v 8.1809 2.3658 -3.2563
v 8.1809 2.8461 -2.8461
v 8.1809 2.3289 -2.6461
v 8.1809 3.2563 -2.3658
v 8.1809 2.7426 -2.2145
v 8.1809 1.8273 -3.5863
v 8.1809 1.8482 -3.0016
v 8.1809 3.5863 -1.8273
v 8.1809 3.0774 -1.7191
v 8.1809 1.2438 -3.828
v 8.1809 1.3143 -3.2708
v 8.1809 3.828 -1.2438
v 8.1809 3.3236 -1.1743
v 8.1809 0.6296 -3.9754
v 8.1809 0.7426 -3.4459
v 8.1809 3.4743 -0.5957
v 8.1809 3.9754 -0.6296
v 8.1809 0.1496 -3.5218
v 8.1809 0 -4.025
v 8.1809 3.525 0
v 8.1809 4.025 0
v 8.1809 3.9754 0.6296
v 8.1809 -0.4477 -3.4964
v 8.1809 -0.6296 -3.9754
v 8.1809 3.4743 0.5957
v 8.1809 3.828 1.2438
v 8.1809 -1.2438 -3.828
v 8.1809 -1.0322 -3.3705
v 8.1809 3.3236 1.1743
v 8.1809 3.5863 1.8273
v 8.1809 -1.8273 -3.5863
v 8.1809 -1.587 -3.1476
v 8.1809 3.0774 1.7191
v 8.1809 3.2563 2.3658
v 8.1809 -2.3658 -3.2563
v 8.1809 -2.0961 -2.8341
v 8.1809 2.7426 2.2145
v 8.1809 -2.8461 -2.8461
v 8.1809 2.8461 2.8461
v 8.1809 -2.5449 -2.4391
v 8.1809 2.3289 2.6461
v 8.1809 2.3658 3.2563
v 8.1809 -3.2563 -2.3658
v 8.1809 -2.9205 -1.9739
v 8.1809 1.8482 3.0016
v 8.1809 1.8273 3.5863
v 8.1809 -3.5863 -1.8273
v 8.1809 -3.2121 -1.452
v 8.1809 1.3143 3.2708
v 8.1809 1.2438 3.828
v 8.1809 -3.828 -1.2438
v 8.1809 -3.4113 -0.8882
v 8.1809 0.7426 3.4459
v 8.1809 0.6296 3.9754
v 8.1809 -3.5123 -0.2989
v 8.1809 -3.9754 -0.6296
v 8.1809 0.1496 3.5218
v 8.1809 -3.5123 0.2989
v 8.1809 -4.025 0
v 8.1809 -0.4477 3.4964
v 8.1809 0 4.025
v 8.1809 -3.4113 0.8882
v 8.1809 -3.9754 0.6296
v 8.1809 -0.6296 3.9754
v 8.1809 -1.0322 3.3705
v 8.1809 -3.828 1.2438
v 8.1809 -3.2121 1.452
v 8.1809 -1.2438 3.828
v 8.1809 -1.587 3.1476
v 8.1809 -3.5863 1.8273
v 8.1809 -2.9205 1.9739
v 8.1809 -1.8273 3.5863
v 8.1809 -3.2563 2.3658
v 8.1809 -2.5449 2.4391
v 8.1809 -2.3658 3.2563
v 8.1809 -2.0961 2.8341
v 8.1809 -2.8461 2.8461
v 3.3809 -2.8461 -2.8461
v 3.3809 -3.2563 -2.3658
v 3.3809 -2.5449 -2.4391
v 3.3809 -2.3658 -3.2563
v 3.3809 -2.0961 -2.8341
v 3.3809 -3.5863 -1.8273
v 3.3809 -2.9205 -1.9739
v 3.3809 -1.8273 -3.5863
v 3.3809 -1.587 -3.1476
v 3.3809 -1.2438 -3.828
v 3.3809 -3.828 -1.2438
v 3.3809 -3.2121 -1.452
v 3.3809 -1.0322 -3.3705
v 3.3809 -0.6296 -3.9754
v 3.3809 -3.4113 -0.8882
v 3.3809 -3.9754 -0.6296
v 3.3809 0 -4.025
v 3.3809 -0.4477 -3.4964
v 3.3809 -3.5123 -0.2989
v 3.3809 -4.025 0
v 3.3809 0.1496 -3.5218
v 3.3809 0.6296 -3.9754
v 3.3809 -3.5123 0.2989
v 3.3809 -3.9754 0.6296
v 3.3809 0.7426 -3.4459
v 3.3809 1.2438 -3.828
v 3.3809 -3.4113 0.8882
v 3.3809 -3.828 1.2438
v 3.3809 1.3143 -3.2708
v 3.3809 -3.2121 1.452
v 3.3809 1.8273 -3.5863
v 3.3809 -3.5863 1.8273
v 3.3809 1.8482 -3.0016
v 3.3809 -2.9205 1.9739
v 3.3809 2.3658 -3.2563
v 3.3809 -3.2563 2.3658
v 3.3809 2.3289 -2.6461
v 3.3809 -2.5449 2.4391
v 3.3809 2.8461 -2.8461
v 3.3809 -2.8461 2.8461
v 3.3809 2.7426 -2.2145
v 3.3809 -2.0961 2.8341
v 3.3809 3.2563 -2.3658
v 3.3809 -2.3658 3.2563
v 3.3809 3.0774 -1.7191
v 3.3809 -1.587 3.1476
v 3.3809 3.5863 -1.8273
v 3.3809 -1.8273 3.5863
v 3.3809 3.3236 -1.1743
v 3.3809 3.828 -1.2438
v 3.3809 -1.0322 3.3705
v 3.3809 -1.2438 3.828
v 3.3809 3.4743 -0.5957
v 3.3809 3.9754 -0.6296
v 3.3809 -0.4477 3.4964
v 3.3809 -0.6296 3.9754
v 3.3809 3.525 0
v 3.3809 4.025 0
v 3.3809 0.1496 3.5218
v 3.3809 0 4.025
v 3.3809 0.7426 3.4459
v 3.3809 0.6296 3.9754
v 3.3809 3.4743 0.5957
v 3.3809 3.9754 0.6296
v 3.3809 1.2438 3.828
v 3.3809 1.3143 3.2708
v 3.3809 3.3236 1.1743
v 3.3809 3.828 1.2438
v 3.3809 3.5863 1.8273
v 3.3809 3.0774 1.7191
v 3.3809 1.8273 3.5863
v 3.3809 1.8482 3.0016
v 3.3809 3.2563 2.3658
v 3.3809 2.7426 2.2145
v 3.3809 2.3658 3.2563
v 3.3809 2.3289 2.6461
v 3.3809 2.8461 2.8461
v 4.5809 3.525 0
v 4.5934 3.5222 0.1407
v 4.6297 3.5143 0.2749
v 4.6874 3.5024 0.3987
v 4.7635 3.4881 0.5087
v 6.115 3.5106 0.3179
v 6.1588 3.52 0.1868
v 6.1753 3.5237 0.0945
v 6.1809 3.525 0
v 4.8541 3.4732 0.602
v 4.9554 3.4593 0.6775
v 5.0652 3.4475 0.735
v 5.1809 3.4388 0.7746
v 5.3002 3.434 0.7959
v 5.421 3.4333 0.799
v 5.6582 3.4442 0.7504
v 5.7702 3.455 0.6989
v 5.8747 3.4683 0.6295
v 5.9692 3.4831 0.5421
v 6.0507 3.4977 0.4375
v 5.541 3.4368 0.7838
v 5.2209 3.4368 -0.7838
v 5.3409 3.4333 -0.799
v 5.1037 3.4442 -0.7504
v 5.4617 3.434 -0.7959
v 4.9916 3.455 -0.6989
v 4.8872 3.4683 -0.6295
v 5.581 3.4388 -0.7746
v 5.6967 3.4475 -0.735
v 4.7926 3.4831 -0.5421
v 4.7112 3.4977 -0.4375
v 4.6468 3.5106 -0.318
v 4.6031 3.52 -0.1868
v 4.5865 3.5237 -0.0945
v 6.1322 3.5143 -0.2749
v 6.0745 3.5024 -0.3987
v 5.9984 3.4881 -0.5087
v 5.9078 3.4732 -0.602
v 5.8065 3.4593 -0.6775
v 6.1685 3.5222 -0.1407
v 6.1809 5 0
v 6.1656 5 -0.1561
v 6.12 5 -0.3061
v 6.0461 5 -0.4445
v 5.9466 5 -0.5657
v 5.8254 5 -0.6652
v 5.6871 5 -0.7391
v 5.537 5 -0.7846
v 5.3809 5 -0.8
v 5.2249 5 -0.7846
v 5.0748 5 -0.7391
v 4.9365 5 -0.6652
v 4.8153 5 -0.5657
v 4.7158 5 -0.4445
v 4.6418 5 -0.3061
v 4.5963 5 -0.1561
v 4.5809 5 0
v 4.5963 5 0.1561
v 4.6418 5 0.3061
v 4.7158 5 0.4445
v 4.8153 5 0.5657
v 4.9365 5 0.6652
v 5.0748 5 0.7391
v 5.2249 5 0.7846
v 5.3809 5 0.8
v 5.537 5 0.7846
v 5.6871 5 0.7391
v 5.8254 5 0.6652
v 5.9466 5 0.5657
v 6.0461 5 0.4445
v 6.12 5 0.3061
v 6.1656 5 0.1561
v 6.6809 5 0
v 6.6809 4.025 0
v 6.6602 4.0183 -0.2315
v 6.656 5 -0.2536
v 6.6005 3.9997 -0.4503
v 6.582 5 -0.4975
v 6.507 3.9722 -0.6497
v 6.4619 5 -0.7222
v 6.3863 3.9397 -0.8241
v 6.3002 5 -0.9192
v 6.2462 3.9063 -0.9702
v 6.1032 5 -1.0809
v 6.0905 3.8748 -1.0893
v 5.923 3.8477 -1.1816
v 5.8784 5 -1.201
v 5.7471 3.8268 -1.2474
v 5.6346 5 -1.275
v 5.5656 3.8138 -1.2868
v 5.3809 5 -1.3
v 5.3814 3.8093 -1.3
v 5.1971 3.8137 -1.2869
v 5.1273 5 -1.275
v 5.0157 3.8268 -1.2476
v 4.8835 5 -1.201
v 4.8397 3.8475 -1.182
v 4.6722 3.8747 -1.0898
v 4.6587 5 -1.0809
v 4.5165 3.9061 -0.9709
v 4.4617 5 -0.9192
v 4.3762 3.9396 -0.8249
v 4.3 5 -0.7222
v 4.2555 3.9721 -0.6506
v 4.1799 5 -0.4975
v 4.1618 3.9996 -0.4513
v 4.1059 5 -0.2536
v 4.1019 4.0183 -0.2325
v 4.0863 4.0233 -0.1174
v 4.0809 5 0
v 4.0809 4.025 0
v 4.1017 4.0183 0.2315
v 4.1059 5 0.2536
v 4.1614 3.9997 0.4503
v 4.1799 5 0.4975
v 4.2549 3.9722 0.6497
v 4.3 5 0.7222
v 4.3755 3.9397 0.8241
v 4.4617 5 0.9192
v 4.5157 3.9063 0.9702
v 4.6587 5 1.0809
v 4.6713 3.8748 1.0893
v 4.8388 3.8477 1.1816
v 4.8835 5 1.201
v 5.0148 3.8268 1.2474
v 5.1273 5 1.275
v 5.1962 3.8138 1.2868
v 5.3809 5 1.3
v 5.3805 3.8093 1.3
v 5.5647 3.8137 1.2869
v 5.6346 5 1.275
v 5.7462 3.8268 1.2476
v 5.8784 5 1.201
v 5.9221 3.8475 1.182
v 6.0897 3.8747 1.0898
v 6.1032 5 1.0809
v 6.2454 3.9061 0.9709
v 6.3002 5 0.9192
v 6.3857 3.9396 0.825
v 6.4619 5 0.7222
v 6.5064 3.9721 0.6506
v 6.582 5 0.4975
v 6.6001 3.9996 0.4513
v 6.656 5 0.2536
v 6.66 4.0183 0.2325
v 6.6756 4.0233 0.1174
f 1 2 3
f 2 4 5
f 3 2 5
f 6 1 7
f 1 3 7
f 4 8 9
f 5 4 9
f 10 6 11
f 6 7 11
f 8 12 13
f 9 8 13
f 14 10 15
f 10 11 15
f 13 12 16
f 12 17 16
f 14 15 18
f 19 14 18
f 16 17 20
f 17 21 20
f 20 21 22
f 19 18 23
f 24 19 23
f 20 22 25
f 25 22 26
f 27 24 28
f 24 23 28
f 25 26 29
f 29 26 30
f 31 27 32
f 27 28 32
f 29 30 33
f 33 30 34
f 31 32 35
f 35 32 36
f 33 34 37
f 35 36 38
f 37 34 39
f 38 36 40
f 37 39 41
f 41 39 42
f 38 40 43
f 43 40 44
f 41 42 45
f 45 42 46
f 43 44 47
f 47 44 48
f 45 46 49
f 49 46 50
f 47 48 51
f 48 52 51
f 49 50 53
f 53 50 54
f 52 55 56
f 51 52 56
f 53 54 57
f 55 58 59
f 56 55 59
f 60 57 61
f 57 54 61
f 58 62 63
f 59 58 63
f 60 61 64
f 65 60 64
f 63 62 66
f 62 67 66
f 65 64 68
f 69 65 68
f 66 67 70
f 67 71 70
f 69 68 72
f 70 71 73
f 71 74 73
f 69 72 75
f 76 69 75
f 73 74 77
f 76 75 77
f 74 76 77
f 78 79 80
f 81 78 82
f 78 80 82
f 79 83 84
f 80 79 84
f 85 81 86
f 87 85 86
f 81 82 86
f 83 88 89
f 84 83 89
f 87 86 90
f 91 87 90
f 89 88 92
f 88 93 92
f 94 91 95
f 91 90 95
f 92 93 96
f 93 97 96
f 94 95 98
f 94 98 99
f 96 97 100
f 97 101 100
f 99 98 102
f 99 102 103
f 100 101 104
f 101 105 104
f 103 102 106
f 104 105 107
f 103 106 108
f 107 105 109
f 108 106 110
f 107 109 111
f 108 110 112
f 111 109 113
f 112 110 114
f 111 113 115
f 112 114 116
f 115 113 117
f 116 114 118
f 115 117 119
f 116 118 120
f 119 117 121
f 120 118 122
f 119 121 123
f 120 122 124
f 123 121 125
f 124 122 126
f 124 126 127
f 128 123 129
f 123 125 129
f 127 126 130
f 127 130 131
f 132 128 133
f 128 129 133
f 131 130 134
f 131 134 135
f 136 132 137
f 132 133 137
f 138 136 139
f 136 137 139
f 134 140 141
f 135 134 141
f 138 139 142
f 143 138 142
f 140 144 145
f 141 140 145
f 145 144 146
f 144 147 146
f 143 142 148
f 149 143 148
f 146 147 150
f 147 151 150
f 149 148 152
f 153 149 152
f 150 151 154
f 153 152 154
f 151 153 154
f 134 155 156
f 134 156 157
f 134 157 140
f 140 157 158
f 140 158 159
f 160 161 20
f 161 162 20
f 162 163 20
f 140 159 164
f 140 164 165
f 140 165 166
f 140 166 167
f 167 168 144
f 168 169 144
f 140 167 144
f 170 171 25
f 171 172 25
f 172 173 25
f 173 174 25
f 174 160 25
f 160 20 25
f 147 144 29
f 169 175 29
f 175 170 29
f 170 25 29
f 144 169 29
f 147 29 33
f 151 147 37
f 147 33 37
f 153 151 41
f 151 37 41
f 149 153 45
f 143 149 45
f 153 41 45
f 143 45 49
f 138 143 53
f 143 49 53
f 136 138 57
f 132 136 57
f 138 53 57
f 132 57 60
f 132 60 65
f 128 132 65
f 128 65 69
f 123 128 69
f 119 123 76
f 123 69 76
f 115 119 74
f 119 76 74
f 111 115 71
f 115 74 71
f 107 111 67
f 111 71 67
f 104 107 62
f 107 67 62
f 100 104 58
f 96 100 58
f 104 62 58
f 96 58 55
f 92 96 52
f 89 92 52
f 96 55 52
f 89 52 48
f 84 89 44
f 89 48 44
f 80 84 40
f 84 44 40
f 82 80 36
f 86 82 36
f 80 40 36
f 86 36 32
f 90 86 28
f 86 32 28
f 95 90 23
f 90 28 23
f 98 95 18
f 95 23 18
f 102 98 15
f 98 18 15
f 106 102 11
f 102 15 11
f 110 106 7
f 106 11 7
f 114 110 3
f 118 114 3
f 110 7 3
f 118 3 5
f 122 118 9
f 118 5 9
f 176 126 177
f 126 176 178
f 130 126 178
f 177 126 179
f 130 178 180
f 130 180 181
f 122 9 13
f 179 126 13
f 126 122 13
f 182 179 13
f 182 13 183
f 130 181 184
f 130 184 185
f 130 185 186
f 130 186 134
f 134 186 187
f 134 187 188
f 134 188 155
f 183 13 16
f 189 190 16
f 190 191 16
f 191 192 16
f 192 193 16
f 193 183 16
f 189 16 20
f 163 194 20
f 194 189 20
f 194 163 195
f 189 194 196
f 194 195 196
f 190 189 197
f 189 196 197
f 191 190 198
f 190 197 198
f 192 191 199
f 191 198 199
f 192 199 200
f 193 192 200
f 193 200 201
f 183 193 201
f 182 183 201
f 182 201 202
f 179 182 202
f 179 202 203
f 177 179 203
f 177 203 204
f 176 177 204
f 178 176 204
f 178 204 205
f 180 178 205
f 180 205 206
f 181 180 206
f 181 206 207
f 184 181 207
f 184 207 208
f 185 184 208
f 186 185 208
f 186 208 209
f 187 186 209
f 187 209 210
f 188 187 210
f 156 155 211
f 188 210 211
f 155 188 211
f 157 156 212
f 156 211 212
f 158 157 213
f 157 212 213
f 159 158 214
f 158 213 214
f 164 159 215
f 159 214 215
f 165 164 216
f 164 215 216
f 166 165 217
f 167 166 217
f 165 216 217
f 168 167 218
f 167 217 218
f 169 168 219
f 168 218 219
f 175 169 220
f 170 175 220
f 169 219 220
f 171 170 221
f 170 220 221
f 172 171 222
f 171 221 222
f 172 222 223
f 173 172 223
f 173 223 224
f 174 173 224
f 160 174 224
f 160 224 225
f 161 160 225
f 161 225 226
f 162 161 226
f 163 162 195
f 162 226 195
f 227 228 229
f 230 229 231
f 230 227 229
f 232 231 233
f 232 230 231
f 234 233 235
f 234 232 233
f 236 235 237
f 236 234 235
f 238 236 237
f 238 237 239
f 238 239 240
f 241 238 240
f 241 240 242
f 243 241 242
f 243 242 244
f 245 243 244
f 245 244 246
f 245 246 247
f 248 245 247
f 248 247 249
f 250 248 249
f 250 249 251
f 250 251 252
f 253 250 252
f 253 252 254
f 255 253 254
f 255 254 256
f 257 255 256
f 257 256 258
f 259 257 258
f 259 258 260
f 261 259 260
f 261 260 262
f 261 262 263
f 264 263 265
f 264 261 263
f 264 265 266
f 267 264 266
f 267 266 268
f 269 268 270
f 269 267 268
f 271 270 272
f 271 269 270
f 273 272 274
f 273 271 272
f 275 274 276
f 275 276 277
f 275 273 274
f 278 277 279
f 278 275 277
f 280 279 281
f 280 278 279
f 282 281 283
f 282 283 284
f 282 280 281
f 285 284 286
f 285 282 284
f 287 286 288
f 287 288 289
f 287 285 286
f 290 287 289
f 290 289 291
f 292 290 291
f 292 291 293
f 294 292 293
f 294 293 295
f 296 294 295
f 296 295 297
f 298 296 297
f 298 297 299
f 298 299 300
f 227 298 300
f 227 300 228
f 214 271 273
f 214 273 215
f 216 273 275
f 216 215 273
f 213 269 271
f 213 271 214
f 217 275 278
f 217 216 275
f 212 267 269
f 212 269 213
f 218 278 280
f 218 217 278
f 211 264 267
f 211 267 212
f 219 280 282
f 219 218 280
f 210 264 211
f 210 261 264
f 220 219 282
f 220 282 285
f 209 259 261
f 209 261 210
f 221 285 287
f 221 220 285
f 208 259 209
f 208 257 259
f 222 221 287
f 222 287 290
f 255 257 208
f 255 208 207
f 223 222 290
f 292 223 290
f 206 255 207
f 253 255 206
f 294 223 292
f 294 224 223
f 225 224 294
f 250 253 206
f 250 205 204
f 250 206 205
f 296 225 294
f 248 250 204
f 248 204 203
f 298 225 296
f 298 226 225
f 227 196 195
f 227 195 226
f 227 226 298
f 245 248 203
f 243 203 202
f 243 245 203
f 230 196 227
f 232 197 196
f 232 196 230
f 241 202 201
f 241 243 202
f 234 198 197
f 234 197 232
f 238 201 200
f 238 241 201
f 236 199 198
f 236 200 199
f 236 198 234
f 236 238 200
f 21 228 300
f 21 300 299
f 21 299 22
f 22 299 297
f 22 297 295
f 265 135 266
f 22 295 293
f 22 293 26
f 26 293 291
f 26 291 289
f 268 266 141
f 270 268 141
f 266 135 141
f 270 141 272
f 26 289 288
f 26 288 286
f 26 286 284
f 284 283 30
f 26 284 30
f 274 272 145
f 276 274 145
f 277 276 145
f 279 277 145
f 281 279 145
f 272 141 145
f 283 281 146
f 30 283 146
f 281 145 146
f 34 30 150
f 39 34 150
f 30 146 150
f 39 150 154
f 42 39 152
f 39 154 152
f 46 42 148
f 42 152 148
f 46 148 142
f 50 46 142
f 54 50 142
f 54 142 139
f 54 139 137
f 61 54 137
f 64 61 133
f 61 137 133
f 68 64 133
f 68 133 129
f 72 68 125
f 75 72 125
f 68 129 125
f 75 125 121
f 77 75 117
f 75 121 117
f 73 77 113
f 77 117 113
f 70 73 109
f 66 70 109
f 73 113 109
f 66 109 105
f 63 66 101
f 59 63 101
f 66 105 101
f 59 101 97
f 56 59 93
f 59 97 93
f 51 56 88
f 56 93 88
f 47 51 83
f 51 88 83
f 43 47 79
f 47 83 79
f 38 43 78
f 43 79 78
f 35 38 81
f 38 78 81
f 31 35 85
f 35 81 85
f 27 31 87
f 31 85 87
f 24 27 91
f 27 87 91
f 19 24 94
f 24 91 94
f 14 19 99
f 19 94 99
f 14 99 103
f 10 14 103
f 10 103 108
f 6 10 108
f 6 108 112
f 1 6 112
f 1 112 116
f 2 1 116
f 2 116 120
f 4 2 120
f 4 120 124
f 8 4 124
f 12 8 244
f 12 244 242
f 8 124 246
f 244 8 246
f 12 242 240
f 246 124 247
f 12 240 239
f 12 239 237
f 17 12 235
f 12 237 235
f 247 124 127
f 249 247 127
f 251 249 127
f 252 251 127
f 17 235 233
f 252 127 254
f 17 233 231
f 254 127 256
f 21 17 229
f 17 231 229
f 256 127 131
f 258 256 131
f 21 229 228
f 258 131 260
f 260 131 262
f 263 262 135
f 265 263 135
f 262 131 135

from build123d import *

# Parameters (mm, degrees)
SKETCH_10_R         = 1.3
EXTRUDE_1_DEPTH     = 1.3
SKETCH_11_R         = 0.8
CUT_EXTRUDE_2_DEPTH = 5.65


with BuildPart() as part:
    # 草图1 → 旋转1 (revolve)
    with BuildSketch(Plane.XY):
        Polygon((3.380941288, 3.525), (4.357609697, 3.525), (4.769072518, 3.525), (8.180941288, 3.525), (8.180941288, 4.025), (7.380941288, 4.025), (3.380941288, 4.025), align=None)
    revolve(axis=Axis((0, 0, 0), (1, 0, 0)))

    # 草图10 → 凸台-拉伸1 (add)
    with BuildSketch(Plane(origin=(0, 5, 0), x_dir=(1, 0, 0), z_dir=(0, 1, 0))):
        with Locations((5.380941288, 0)):
            Circle(SKETCH_10_R)
    extrude(amount=-EXTRUDE_1_DEPTH)

    # 草图11 → 切除-拉伸2 (cut, symmetric)
    with BuildSketch(Plane(origin=(0, 5, 0), x_dir=(1, 0, 0), z_dir=(0, 1, 0))):
        with Locations((5.380941288, 0)):
            Circle(SKETCH_11_R)
    extrude(amount=CUT_EXTRUDE_2_DEPTH, both=True, mode=Mode.SUBTRACT)


solid = part.part
